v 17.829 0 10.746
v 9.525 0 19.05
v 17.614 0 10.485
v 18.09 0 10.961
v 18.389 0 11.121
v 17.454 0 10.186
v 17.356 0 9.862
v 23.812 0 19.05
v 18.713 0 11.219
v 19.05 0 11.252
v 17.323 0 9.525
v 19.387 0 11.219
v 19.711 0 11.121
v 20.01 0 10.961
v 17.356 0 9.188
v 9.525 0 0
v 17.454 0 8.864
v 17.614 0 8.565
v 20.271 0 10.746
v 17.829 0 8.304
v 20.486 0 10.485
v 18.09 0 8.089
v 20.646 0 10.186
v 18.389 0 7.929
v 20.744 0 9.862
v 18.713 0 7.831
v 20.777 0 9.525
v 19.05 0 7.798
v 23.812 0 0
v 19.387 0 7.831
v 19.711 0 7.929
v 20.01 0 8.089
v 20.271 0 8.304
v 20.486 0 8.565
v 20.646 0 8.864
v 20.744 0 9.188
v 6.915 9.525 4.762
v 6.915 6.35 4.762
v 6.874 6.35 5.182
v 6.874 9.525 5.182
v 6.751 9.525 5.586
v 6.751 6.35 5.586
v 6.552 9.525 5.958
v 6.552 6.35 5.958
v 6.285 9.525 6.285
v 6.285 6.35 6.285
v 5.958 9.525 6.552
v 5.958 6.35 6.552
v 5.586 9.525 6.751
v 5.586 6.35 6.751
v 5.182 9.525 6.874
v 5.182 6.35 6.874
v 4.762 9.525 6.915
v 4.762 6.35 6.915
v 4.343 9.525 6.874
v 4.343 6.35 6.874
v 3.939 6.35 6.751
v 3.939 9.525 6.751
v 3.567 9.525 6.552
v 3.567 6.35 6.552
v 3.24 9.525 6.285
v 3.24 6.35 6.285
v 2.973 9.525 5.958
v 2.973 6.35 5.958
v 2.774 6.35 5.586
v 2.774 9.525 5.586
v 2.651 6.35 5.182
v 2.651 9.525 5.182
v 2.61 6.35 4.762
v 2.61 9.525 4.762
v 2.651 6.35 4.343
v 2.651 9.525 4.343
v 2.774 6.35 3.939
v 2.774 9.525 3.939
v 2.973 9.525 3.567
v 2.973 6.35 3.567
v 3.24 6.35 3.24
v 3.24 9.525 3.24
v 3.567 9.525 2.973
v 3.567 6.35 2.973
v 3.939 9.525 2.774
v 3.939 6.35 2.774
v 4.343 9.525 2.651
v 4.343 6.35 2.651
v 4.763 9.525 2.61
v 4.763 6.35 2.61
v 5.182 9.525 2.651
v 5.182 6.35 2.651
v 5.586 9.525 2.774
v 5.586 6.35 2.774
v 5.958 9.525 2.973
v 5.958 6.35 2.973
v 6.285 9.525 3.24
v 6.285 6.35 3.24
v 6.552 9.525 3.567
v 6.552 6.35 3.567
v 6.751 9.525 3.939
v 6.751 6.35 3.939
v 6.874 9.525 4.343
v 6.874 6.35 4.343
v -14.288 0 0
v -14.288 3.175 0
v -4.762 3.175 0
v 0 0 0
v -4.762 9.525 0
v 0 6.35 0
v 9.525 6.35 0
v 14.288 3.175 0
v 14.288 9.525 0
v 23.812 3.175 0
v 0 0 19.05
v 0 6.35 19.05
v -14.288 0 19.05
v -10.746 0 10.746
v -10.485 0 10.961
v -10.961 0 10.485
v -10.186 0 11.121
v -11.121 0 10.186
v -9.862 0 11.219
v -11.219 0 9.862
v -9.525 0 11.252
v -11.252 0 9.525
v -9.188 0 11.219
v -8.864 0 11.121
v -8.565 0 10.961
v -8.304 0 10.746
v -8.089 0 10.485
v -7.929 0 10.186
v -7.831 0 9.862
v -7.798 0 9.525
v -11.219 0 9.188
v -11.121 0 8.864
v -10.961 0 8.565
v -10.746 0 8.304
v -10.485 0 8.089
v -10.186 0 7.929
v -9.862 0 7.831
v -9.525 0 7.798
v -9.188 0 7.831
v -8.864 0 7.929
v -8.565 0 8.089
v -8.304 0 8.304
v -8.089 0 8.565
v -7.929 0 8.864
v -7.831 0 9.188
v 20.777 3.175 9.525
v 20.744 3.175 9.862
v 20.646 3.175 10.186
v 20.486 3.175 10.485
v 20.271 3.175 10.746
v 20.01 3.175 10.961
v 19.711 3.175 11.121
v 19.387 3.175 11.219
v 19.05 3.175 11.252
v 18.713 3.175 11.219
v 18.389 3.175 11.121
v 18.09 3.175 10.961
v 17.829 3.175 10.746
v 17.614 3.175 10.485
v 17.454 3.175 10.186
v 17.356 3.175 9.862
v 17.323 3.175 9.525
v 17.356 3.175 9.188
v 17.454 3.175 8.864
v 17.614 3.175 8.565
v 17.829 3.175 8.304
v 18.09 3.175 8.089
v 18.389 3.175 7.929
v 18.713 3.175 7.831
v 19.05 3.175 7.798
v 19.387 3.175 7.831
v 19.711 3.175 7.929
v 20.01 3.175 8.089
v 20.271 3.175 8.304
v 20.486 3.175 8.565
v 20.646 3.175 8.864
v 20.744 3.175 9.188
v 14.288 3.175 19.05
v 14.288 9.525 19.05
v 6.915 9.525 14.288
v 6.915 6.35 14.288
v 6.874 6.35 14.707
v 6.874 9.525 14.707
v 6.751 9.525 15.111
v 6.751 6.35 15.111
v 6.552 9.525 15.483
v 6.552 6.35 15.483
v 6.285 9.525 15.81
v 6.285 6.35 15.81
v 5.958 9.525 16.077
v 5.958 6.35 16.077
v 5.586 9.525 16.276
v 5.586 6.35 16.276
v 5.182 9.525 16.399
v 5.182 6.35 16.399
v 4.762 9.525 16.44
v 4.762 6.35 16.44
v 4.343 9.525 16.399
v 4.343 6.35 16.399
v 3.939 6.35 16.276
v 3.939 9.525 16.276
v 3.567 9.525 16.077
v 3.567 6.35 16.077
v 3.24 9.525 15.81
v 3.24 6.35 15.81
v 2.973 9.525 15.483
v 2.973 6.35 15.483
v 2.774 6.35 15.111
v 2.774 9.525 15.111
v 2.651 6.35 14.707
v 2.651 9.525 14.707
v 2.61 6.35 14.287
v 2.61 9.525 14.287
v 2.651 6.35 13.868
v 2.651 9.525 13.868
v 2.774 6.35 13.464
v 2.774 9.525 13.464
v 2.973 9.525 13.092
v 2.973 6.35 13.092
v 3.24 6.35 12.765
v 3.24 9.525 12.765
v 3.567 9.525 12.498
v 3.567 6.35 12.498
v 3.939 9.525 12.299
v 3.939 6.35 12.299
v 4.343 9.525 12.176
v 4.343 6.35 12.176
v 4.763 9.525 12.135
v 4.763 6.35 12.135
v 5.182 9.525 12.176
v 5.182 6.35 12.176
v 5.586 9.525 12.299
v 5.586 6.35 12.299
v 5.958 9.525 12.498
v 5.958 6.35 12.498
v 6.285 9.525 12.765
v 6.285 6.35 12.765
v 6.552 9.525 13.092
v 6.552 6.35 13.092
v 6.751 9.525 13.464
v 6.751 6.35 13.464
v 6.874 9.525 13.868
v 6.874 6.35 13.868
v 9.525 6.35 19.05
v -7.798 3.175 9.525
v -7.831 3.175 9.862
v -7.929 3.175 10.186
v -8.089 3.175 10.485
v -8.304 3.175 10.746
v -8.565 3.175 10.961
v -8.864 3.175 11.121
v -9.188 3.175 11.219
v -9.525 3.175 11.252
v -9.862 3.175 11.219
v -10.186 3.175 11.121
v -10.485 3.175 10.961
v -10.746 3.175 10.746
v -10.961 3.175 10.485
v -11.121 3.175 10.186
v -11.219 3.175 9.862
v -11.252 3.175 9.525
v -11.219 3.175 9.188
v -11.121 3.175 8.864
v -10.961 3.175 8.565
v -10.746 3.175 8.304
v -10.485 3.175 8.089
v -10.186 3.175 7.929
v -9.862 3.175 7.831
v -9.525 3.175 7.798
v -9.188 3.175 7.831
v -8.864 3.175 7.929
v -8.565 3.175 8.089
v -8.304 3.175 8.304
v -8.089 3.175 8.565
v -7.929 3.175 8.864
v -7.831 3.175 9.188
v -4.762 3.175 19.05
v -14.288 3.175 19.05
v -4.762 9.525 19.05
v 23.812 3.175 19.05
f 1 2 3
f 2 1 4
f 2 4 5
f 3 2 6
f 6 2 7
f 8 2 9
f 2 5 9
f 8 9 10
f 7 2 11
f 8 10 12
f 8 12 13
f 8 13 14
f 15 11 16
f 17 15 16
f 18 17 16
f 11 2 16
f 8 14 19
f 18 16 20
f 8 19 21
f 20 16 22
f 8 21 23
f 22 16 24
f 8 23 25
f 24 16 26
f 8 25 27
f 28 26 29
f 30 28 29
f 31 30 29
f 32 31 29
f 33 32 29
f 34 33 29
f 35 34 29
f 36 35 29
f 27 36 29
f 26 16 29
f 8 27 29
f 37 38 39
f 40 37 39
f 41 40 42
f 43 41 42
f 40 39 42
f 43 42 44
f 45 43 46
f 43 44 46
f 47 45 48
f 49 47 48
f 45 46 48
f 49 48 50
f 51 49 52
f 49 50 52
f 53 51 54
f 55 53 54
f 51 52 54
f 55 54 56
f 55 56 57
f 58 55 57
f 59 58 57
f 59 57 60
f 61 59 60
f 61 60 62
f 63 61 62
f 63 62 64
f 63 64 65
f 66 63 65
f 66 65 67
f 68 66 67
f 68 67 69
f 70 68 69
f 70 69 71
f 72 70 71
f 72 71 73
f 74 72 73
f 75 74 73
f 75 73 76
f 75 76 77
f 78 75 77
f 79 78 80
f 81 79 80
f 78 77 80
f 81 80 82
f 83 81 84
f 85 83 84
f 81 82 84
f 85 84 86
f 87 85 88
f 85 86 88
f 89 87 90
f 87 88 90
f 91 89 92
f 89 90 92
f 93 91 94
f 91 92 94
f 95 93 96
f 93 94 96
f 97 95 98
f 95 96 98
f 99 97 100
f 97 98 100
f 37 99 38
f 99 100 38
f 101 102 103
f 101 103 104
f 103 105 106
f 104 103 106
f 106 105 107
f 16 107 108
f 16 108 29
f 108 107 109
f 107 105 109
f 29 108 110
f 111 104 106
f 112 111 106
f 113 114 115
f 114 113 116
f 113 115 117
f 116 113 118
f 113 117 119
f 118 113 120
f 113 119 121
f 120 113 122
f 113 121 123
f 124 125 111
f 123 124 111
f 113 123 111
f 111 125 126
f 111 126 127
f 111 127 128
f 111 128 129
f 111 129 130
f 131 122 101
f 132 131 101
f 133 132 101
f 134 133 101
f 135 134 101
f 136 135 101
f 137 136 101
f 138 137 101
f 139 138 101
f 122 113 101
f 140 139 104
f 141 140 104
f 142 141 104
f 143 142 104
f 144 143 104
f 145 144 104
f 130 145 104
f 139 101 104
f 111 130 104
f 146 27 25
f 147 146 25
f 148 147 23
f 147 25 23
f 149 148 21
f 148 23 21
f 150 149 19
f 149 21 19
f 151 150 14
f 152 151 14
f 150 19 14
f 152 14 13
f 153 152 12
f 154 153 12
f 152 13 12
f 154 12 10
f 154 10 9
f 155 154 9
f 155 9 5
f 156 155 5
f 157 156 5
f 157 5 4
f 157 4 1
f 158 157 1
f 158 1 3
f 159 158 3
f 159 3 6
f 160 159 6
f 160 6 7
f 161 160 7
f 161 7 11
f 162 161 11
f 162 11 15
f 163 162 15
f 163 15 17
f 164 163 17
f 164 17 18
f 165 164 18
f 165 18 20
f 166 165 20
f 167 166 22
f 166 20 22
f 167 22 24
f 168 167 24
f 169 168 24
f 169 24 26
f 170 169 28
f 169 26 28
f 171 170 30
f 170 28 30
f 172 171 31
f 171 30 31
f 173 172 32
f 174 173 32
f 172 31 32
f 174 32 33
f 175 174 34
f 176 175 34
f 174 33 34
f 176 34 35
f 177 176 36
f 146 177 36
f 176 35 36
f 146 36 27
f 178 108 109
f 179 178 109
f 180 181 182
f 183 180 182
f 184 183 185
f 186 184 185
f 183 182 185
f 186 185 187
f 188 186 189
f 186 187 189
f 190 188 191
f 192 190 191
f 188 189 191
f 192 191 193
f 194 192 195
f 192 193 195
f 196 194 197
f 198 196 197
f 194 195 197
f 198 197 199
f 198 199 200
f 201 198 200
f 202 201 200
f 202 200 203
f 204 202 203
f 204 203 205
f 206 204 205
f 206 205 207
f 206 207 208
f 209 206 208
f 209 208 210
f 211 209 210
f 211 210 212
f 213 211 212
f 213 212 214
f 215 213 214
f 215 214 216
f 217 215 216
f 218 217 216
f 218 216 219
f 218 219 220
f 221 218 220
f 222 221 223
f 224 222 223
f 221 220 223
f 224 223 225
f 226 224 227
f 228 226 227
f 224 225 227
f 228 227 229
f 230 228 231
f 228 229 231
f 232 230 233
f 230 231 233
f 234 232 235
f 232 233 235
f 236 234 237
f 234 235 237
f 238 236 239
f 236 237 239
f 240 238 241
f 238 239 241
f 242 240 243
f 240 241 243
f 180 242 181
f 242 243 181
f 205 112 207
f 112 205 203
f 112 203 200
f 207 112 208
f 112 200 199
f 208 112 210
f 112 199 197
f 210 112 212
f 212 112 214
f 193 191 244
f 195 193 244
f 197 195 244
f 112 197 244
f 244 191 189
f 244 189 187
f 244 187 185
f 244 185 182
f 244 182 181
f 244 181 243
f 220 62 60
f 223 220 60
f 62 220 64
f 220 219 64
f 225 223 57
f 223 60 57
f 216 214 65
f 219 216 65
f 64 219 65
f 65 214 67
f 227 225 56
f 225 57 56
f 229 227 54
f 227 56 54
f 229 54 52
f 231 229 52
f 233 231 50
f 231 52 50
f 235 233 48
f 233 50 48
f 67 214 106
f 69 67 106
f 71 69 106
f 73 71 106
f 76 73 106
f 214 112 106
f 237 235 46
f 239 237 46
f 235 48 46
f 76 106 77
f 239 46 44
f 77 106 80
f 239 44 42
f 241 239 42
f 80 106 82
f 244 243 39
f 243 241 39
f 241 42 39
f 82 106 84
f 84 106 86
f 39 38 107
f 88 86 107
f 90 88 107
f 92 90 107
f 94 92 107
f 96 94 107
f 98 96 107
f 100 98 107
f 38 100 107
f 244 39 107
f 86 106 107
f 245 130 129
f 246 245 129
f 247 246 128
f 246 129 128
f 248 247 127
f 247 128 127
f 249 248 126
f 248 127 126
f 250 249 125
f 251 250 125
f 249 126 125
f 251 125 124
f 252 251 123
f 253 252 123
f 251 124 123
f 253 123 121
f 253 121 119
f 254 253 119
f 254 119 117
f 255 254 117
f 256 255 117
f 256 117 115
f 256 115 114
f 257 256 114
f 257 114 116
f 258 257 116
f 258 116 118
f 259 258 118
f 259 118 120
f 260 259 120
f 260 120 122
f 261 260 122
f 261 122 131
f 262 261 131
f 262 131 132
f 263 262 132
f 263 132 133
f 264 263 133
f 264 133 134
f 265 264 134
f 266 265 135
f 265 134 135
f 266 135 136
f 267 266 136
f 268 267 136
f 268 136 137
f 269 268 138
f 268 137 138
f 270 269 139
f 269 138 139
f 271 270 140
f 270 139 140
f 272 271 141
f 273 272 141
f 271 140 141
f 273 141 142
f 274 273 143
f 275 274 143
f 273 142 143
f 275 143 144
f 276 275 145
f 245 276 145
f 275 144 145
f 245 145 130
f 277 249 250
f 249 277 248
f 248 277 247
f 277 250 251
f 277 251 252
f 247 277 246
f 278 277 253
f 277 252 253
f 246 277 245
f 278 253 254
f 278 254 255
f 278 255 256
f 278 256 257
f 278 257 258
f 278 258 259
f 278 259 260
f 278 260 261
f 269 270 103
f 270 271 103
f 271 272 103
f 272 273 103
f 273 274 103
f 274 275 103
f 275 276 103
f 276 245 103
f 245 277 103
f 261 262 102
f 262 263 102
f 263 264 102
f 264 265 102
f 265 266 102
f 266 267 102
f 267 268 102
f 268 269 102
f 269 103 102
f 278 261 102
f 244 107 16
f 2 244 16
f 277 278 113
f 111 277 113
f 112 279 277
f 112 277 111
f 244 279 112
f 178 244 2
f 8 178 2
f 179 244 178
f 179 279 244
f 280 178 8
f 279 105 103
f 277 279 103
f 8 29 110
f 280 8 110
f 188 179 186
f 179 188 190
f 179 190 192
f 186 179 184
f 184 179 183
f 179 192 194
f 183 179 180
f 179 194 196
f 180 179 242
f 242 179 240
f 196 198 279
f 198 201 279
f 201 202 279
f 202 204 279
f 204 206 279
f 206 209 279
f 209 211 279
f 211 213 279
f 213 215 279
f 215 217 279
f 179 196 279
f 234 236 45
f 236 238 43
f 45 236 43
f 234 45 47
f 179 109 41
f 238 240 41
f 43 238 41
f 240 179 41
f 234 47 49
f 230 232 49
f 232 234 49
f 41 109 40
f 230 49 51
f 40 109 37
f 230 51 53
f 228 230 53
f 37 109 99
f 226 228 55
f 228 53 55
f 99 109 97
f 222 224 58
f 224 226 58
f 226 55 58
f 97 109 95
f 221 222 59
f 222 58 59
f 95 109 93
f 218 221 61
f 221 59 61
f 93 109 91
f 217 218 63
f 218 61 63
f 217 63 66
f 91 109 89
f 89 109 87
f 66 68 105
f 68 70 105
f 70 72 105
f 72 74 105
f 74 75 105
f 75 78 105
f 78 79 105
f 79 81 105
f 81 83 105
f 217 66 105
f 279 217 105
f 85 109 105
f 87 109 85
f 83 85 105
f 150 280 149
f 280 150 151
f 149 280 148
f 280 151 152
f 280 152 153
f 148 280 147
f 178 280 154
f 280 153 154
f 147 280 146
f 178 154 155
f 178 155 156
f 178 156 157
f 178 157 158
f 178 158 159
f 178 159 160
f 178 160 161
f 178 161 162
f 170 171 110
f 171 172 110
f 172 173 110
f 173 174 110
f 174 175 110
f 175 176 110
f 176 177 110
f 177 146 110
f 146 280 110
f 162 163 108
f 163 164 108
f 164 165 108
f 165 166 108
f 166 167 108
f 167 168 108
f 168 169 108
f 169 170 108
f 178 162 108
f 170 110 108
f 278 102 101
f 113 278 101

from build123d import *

# Parameters (mm, degrees)
F1_DEPTH = 19.05
F2_R     = 2.15265
F2_R_2   = 1.7272
F3_DEPTH = 9.525


with BuildPart() as f1:
    # F0 (on Top) → F1 (new body)
    with BuildSketch(Plane.XY):
        Polygon((0, 0), (0, 6.35), (9.525, 6.35), (9.525, 0), (23.8125, 0), (23.8125, 3.175), (14.2875, 3.175), (14.2875, 9.525), (-4.7625, 9.525), (-4.7625, 3.175), (-14.2875, 3.175), (-14.2875, 0), align=None)
    extrude(amount=F1_DEPTH)

    # F2 (on face) → F3 (cut, through all)
    with BuildSketch(Plane.XZ):
        with Locations((4.7625, 4.7625)):
            Circle(F2_R)
        with Locations((4.7625, 14.2875)):
            Circle(F2_R)
        with Locations((-9.525, 9.525)):
            Circle(F2_R_2)
        with Locations((19.05, 9.525)):
            Circle(F2_R_2)
    extrude(amount=-F3_DEPTH, mode=Mode.SUBTRACT)


solid = f1.part
